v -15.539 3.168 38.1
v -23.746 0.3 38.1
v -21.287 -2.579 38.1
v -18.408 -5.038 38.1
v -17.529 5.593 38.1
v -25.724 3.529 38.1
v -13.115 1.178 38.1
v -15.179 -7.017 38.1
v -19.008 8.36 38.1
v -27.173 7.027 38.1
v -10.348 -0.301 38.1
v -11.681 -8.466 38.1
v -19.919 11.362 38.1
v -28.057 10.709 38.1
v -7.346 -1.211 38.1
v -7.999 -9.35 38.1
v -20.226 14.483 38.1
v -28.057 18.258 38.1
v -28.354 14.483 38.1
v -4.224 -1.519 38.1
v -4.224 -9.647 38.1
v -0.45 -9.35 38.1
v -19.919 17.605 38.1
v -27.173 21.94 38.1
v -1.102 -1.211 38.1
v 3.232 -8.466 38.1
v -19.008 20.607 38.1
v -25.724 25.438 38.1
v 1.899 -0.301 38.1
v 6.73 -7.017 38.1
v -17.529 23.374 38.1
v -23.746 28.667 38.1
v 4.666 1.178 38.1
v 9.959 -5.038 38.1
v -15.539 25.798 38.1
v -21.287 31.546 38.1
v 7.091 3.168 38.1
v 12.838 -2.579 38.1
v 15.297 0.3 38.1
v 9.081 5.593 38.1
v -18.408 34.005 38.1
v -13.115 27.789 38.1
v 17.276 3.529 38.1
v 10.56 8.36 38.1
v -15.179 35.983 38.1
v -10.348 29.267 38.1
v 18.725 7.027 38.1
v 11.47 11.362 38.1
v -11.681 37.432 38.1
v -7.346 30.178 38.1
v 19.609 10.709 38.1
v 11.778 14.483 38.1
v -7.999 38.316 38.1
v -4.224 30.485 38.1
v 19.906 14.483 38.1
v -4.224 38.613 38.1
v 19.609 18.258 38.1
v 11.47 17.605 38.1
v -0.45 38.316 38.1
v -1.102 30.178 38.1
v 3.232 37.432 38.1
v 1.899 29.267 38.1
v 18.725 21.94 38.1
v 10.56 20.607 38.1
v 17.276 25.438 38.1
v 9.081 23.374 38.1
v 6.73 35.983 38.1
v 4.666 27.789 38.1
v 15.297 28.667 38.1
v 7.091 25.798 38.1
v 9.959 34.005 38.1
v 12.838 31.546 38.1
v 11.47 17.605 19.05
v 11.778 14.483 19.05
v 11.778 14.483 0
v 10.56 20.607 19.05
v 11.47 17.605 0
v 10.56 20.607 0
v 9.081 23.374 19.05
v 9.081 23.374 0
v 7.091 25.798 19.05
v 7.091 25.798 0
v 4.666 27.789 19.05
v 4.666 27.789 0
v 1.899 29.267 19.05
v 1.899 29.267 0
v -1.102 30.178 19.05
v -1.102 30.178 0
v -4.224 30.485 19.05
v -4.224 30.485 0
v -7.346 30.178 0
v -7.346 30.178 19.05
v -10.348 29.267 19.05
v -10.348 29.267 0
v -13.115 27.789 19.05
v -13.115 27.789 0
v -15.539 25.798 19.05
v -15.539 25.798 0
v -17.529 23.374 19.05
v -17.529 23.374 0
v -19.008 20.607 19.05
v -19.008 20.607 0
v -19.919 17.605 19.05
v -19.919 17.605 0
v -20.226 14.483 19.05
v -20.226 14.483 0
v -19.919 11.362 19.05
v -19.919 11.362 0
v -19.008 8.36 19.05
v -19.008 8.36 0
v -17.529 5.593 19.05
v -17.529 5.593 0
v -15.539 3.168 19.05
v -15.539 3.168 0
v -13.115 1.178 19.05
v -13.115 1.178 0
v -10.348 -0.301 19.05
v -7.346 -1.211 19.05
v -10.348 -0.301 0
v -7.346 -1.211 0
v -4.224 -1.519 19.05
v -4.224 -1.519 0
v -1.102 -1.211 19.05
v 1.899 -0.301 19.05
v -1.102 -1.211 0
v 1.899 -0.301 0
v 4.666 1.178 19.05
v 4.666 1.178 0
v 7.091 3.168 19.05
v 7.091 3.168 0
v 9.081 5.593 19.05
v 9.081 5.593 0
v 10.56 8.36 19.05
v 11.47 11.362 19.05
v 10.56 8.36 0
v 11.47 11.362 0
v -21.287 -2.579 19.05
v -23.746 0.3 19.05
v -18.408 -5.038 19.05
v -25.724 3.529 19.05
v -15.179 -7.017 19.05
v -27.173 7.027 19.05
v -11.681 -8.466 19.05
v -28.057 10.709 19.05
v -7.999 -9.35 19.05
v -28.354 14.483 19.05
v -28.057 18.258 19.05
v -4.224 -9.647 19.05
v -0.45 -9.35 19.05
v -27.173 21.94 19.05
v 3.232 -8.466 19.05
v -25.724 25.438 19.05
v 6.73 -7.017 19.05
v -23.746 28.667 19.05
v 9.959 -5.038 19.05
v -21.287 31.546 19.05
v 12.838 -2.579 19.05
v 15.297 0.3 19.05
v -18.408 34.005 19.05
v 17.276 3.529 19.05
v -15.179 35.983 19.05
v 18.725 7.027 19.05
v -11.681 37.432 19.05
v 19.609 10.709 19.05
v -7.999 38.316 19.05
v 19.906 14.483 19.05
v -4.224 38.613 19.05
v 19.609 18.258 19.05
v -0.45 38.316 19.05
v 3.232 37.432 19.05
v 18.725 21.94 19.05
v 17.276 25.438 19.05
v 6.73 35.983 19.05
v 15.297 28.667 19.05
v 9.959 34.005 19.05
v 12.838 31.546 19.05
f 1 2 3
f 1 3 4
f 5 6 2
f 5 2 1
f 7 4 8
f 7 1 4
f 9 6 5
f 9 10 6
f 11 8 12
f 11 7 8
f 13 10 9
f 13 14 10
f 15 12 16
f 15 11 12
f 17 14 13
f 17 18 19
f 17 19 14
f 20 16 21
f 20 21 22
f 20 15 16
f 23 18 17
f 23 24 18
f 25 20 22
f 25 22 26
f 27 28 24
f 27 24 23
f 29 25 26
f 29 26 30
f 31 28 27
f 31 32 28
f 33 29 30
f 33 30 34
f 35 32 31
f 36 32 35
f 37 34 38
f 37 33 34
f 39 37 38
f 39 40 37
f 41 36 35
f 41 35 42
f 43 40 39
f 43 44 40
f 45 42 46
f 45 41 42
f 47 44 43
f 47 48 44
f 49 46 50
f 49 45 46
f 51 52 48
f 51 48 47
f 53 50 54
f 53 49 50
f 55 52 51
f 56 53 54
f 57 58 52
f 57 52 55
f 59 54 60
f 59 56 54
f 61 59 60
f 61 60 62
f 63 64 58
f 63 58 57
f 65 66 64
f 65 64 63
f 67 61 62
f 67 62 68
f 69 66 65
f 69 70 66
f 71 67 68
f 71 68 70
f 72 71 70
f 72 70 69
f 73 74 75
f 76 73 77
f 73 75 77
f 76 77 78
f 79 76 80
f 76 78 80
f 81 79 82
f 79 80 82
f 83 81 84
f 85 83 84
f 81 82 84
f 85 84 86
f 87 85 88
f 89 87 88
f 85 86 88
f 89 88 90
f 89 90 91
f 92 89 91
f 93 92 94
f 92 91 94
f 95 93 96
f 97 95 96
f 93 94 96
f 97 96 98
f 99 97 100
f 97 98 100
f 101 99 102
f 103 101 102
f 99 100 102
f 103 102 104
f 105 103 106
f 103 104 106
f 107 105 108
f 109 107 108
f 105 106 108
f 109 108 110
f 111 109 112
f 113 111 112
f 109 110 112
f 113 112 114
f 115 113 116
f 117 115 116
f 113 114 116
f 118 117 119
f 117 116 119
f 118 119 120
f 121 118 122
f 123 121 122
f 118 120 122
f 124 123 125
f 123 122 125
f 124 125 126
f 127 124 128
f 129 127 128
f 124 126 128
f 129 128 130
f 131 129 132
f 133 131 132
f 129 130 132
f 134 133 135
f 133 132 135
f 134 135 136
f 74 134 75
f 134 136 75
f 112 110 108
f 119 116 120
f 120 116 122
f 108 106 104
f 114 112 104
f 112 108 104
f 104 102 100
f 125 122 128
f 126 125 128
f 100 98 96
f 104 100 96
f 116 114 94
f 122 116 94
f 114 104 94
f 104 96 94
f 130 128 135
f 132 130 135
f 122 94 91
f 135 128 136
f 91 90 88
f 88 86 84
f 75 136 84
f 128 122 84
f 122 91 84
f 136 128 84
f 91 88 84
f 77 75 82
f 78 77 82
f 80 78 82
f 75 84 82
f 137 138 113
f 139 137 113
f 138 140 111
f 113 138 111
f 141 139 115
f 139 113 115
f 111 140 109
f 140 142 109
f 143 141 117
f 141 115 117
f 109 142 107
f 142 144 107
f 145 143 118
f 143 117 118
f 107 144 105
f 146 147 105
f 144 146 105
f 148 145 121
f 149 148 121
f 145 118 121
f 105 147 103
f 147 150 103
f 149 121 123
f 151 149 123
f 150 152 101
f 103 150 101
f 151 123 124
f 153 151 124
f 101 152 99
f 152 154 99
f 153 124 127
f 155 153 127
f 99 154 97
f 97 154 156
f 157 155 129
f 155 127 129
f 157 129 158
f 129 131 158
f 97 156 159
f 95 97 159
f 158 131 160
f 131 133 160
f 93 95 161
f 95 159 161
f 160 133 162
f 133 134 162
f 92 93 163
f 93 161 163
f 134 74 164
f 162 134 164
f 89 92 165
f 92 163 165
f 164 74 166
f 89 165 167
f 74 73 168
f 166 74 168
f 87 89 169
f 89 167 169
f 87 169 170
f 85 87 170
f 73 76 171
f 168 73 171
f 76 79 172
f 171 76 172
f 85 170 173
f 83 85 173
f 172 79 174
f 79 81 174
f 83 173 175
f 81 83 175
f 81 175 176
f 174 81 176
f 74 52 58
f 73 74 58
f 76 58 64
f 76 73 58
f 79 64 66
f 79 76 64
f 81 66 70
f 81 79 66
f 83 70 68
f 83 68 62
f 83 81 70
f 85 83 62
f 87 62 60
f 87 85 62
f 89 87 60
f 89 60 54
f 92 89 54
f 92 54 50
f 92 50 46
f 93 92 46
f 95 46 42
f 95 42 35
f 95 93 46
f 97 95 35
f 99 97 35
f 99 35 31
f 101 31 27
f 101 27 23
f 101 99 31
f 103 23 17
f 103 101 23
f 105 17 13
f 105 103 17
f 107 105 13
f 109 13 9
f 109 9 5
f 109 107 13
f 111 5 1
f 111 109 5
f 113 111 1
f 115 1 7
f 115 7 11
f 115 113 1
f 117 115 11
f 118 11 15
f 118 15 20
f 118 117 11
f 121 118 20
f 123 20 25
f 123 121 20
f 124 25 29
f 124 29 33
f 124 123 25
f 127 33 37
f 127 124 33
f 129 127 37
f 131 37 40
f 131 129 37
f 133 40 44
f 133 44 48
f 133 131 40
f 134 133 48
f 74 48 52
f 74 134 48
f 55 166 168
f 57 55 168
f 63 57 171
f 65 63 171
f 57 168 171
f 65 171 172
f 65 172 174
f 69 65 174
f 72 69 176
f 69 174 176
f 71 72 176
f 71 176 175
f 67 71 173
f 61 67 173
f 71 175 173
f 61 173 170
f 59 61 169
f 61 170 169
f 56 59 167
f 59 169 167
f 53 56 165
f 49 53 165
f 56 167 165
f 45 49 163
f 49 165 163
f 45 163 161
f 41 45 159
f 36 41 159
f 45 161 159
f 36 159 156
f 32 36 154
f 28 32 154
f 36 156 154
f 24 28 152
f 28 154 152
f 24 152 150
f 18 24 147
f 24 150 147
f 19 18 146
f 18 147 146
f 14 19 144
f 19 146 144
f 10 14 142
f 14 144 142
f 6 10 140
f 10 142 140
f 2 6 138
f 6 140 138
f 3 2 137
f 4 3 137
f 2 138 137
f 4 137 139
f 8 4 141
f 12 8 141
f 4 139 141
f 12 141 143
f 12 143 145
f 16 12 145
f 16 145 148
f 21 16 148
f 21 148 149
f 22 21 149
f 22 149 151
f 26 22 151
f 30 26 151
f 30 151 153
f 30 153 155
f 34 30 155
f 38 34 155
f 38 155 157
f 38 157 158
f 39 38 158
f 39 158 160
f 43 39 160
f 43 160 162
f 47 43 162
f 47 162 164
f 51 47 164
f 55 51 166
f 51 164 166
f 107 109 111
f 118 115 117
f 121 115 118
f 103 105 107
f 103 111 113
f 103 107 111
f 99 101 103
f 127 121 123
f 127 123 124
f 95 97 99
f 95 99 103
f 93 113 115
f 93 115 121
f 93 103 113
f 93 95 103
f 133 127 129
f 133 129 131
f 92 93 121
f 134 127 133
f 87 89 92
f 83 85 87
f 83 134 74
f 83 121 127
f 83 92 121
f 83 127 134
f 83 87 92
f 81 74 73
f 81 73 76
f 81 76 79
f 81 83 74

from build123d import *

# Parameters (mm, degrees)
F0_R     = 16.002
F1_DEPTH = 19.05
F2_R     = 24.13
F2_R_2   = 16.002
F3_DEPTH = 19.05


with BuildPart() as f1:
    # F0 (on Top) → F1 (new body)
    with BuildSketch(Plane.XY):
        with Locations((-4.224315, 14.483362)):
            Circle(F0_R)
    extrude(amount=F1_DEPTH)


with BuildPart() as f3:
    # F2 (on face) → F3 (new body)
    with BuildSketch(Plane.XY.offset(19.05)):
        with Locations((-4.224315, 14.483362)):
            Circle(F2_R)
        with Locations((-4.224315, 14.483362)):
            Circle(F2_R_2, mode=Mode.SUBTRACT)
    extrude(amount=F3_DEPTH)


solid = Compound([f1.part, f3.part])
